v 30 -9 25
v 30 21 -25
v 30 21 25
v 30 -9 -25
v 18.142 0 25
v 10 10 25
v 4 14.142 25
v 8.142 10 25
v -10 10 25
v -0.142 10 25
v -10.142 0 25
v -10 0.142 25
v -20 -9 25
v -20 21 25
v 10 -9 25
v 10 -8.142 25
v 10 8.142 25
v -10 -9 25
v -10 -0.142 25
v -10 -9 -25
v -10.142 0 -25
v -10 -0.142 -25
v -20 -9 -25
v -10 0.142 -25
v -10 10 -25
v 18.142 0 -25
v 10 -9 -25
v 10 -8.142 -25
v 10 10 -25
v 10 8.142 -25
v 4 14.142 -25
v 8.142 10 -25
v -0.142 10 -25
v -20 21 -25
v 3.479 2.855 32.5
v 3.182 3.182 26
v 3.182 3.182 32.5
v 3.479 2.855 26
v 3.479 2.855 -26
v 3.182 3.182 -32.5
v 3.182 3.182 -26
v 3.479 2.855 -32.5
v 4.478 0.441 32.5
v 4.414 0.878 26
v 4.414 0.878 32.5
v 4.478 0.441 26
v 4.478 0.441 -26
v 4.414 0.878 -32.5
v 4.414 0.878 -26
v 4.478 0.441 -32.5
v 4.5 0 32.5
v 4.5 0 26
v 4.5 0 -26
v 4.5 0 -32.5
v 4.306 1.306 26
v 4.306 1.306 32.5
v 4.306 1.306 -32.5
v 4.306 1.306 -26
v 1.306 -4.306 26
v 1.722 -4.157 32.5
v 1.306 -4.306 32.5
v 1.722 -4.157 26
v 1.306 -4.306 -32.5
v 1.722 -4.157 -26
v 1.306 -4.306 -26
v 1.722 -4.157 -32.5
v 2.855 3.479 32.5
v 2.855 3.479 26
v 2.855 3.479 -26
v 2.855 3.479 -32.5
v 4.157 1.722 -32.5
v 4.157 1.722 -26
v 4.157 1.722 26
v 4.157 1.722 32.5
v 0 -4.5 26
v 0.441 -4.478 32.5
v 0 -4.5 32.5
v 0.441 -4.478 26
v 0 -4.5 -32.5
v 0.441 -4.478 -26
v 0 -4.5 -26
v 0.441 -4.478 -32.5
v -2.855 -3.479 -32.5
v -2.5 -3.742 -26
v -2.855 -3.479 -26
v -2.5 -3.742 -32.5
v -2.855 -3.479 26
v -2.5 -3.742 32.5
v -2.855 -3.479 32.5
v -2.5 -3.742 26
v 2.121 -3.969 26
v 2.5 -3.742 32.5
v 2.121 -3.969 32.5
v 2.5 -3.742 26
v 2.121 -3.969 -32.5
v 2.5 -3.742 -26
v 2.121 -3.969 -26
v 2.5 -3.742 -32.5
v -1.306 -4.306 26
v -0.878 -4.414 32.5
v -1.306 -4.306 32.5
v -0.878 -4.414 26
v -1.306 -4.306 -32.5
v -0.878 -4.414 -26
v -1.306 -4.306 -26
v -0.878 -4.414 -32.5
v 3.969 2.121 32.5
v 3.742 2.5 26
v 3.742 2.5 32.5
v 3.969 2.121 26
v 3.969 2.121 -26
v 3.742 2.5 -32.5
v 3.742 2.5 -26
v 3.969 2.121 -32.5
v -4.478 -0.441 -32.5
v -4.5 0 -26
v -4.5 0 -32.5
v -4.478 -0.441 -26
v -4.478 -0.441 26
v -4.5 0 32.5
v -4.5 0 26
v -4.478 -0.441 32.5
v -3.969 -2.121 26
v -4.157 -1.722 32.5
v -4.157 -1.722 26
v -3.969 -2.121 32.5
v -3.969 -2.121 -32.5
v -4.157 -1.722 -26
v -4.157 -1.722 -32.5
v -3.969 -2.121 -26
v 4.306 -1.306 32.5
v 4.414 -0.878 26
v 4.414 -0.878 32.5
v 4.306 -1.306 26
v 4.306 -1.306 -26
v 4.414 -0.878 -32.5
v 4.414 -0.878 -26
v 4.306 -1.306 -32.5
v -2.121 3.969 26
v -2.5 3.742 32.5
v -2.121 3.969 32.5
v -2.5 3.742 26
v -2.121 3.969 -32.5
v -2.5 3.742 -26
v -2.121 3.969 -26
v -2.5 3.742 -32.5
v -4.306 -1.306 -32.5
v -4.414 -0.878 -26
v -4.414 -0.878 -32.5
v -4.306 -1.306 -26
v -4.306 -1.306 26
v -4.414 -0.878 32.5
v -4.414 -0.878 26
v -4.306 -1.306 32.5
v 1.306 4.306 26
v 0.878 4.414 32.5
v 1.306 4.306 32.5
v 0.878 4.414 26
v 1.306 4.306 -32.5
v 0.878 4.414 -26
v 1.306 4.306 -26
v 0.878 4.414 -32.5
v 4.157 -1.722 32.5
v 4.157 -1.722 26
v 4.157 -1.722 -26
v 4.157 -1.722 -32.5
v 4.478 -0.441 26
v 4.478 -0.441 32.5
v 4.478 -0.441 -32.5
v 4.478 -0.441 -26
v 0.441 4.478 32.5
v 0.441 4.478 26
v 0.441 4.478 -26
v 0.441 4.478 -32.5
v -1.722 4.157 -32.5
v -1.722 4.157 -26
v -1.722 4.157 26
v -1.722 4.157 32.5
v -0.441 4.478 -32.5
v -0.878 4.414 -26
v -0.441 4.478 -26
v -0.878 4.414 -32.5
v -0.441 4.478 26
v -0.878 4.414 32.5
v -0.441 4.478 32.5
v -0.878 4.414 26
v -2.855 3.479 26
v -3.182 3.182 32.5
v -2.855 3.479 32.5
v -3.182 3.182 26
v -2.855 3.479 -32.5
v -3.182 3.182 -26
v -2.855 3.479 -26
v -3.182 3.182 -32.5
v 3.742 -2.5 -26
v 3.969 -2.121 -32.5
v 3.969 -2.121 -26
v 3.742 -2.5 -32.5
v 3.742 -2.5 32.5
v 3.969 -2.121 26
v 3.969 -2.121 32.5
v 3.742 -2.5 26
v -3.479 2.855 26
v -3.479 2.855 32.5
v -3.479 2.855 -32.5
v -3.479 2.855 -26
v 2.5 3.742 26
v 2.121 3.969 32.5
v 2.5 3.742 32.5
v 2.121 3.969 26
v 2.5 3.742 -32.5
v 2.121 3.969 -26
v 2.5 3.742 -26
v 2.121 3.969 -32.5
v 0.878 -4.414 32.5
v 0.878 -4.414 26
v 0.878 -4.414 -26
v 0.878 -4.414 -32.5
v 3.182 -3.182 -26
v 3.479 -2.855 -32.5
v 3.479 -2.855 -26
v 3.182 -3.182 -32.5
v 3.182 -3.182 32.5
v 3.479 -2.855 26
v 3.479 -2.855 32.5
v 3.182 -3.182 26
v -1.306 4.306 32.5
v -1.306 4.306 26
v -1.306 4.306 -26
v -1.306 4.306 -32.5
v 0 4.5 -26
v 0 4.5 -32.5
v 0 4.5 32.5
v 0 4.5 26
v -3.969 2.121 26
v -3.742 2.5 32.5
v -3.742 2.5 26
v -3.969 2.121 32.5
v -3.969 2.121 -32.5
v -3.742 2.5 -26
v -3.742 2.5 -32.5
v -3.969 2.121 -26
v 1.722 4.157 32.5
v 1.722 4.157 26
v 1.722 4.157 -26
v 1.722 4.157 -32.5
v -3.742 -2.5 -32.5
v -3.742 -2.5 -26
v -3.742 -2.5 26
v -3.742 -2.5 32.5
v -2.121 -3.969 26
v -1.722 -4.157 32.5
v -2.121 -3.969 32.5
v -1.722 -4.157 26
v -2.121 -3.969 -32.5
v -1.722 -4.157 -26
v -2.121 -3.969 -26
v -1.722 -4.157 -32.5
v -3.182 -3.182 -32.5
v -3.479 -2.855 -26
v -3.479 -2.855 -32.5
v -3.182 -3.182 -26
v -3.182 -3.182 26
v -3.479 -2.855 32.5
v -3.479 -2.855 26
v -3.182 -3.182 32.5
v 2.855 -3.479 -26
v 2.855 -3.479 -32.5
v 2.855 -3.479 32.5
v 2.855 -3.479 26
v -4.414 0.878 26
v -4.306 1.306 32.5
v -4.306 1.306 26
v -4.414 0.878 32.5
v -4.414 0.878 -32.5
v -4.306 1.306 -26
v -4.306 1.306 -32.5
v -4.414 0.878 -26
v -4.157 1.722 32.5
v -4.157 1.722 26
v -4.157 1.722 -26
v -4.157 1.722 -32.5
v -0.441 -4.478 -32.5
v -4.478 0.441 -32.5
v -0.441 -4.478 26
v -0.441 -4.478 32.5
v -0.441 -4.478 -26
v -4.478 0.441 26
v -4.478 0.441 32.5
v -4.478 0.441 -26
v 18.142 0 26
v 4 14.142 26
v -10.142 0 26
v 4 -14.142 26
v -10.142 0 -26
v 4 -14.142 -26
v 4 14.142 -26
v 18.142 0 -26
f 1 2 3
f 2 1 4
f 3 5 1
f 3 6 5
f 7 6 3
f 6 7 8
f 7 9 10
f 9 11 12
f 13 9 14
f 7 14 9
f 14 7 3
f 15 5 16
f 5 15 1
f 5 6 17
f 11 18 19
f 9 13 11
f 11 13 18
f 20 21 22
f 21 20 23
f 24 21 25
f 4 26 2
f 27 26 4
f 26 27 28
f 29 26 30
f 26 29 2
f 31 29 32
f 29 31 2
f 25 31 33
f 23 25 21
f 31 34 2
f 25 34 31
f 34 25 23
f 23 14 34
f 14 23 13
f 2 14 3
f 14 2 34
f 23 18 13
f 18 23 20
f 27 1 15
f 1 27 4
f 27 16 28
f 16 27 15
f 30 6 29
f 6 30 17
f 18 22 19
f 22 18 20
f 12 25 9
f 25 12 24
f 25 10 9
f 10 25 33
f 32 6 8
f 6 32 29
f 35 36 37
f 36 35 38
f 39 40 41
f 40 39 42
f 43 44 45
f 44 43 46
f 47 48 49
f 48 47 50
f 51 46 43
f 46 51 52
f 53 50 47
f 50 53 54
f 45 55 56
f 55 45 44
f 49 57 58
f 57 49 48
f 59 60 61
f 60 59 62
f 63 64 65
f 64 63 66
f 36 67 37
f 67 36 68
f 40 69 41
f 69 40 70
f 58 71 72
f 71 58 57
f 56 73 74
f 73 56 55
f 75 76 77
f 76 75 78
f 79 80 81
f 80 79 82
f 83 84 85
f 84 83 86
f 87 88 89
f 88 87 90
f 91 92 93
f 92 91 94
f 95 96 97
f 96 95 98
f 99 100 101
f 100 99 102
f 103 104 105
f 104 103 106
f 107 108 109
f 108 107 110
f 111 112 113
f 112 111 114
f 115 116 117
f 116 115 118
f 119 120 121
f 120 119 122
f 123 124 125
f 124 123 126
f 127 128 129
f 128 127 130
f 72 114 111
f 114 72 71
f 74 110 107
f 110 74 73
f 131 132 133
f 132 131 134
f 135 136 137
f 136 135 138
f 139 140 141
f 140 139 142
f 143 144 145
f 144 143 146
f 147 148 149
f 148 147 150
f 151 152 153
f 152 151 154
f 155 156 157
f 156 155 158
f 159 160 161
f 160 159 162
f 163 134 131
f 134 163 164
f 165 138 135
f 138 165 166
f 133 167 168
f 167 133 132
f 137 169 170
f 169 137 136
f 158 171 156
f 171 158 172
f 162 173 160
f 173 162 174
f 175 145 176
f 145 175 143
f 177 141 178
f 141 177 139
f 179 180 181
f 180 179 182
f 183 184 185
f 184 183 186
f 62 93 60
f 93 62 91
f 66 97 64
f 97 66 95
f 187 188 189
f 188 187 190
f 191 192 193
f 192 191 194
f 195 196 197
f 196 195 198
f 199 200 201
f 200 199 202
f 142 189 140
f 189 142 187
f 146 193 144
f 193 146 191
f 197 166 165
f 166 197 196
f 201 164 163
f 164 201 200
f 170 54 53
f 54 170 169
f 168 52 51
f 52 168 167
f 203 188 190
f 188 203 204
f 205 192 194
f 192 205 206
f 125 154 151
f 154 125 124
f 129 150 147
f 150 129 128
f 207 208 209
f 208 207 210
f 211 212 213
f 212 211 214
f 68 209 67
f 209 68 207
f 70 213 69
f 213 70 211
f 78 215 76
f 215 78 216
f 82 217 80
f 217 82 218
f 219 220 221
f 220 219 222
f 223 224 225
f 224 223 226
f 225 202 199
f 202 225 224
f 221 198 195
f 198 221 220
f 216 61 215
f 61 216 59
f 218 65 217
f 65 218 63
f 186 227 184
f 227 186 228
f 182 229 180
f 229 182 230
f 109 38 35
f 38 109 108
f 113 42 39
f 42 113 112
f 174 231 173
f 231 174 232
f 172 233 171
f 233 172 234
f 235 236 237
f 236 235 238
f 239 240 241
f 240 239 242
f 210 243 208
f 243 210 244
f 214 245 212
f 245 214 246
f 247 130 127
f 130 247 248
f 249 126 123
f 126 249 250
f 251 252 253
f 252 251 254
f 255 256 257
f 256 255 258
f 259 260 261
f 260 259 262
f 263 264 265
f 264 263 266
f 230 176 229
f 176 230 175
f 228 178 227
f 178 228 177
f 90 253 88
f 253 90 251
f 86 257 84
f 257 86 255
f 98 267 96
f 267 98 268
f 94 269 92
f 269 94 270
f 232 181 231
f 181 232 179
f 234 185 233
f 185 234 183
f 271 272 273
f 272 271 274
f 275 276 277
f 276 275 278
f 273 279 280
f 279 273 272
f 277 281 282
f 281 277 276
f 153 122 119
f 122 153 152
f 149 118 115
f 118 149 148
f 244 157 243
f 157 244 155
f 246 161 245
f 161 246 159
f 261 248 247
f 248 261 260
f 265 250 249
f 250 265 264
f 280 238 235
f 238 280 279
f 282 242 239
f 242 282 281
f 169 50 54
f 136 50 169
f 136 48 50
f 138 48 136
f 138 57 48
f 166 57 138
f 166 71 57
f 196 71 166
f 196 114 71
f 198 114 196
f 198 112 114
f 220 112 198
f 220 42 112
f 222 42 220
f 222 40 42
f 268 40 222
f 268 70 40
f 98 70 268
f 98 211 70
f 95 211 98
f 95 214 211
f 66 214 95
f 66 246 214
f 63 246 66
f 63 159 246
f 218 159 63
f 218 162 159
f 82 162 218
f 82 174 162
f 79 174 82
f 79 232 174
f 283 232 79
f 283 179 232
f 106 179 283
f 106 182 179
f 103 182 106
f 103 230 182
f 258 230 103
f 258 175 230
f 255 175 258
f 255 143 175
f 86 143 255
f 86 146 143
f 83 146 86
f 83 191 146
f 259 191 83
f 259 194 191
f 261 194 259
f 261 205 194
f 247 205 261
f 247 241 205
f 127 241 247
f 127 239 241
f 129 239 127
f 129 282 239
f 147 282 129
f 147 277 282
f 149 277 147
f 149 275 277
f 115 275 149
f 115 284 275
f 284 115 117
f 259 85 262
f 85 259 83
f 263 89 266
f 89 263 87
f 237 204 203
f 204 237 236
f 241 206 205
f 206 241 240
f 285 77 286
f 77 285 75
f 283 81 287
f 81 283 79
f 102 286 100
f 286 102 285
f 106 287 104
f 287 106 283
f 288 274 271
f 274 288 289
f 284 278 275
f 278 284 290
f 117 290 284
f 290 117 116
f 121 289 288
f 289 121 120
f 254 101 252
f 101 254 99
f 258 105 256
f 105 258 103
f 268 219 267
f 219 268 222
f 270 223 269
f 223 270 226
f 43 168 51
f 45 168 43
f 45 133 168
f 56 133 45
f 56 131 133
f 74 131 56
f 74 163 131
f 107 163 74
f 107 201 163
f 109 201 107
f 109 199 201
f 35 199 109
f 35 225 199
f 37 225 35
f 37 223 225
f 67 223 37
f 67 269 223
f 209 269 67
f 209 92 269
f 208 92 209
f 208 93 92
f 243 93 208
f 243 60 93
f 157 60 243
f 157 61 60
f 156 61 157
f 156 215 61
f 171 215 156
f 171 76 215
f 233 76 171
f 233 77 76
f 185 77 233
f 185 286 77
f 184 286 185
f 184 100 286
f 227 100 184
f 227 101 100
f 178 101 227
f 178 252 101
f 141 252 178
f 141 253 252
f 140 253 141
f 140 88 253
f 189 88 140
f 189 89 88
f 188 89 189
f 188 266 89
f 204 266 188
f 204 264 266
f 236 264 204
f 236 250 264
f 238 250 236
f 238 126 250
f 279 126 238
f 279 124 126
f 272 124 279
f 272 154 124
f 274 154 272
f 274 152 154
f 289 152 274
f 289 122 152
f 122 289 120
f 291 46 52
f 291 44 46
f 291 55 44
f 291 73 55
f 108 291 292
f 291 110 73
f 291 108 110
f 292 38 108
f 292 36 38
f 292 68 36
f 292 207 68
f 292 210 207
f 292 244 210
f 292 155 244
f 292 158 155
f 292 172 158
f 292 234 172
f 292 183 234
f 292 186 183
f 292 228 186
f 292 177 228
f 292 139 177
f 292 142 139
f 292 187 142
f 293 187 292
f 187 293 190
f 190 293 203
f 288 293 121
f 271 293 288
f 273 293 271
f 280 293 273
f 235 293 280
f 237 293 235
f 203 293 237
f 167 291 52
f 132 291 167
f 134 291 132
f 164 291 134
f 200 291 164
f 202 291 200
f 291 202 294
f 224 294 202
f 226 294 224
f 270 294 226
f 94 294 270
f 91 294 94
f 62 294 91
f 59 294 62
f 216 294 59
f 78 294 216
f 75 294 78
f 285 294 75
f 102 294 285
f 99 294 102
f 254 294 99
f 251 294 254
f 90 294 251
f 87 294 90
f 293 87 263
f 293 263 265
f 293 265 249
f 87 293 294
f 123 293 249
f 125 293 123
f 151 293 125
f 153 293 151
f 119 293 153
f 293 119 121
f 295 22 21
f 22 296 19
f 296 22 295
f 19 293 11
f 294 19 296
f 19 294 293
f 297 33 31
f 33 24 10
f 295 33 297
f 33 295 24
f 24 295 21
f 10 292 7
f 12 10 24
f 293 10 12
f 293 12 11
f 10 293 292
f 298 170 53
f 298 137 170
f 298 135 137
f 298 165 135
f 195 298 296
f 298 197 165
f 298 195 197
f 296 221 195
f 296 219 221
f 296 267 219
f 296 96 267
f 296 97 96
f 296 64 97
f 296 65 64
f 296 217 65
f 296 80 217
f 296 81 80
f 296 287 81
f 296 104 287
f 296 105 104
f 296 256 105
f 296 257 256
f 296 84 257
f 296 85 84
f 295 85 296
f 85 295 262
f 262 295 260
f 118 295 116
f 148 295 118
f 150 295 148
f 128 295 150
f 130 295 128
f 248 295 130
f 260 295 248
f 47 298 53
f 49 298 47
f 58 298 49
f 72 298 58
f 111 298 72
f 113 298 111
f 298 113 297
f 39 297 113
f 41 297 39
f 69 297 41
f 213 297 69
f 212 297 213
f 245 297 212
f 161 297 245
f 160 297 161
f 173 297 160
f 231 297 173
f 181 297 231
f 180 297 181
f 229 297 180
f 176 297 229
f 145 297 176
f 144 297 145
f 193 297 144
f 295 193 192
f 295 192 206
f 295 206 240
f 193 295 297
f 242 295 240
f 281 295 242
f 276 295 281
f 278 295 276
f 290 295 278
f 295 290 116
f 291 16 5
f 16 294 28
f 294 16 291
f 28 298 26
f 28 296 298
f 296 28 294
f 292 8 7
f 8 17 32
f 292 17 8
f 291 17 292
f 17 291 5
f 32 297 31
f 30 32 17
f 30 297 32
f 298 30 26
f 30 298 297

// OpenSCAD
laser();
translate([4, 0, 0])
rotate([0, 0, 45])
cube([20, 20, 52], center=true);
holder();

module laser() {
  cylinder(d=9, h=65, $fn=64, center=true);
}

module holder() {
  difference() {
    translate([5, 5+1, 0])
    cube([50, 30, 50], center=true);
    cube([20, 20, 52], center=true);
  }
}
